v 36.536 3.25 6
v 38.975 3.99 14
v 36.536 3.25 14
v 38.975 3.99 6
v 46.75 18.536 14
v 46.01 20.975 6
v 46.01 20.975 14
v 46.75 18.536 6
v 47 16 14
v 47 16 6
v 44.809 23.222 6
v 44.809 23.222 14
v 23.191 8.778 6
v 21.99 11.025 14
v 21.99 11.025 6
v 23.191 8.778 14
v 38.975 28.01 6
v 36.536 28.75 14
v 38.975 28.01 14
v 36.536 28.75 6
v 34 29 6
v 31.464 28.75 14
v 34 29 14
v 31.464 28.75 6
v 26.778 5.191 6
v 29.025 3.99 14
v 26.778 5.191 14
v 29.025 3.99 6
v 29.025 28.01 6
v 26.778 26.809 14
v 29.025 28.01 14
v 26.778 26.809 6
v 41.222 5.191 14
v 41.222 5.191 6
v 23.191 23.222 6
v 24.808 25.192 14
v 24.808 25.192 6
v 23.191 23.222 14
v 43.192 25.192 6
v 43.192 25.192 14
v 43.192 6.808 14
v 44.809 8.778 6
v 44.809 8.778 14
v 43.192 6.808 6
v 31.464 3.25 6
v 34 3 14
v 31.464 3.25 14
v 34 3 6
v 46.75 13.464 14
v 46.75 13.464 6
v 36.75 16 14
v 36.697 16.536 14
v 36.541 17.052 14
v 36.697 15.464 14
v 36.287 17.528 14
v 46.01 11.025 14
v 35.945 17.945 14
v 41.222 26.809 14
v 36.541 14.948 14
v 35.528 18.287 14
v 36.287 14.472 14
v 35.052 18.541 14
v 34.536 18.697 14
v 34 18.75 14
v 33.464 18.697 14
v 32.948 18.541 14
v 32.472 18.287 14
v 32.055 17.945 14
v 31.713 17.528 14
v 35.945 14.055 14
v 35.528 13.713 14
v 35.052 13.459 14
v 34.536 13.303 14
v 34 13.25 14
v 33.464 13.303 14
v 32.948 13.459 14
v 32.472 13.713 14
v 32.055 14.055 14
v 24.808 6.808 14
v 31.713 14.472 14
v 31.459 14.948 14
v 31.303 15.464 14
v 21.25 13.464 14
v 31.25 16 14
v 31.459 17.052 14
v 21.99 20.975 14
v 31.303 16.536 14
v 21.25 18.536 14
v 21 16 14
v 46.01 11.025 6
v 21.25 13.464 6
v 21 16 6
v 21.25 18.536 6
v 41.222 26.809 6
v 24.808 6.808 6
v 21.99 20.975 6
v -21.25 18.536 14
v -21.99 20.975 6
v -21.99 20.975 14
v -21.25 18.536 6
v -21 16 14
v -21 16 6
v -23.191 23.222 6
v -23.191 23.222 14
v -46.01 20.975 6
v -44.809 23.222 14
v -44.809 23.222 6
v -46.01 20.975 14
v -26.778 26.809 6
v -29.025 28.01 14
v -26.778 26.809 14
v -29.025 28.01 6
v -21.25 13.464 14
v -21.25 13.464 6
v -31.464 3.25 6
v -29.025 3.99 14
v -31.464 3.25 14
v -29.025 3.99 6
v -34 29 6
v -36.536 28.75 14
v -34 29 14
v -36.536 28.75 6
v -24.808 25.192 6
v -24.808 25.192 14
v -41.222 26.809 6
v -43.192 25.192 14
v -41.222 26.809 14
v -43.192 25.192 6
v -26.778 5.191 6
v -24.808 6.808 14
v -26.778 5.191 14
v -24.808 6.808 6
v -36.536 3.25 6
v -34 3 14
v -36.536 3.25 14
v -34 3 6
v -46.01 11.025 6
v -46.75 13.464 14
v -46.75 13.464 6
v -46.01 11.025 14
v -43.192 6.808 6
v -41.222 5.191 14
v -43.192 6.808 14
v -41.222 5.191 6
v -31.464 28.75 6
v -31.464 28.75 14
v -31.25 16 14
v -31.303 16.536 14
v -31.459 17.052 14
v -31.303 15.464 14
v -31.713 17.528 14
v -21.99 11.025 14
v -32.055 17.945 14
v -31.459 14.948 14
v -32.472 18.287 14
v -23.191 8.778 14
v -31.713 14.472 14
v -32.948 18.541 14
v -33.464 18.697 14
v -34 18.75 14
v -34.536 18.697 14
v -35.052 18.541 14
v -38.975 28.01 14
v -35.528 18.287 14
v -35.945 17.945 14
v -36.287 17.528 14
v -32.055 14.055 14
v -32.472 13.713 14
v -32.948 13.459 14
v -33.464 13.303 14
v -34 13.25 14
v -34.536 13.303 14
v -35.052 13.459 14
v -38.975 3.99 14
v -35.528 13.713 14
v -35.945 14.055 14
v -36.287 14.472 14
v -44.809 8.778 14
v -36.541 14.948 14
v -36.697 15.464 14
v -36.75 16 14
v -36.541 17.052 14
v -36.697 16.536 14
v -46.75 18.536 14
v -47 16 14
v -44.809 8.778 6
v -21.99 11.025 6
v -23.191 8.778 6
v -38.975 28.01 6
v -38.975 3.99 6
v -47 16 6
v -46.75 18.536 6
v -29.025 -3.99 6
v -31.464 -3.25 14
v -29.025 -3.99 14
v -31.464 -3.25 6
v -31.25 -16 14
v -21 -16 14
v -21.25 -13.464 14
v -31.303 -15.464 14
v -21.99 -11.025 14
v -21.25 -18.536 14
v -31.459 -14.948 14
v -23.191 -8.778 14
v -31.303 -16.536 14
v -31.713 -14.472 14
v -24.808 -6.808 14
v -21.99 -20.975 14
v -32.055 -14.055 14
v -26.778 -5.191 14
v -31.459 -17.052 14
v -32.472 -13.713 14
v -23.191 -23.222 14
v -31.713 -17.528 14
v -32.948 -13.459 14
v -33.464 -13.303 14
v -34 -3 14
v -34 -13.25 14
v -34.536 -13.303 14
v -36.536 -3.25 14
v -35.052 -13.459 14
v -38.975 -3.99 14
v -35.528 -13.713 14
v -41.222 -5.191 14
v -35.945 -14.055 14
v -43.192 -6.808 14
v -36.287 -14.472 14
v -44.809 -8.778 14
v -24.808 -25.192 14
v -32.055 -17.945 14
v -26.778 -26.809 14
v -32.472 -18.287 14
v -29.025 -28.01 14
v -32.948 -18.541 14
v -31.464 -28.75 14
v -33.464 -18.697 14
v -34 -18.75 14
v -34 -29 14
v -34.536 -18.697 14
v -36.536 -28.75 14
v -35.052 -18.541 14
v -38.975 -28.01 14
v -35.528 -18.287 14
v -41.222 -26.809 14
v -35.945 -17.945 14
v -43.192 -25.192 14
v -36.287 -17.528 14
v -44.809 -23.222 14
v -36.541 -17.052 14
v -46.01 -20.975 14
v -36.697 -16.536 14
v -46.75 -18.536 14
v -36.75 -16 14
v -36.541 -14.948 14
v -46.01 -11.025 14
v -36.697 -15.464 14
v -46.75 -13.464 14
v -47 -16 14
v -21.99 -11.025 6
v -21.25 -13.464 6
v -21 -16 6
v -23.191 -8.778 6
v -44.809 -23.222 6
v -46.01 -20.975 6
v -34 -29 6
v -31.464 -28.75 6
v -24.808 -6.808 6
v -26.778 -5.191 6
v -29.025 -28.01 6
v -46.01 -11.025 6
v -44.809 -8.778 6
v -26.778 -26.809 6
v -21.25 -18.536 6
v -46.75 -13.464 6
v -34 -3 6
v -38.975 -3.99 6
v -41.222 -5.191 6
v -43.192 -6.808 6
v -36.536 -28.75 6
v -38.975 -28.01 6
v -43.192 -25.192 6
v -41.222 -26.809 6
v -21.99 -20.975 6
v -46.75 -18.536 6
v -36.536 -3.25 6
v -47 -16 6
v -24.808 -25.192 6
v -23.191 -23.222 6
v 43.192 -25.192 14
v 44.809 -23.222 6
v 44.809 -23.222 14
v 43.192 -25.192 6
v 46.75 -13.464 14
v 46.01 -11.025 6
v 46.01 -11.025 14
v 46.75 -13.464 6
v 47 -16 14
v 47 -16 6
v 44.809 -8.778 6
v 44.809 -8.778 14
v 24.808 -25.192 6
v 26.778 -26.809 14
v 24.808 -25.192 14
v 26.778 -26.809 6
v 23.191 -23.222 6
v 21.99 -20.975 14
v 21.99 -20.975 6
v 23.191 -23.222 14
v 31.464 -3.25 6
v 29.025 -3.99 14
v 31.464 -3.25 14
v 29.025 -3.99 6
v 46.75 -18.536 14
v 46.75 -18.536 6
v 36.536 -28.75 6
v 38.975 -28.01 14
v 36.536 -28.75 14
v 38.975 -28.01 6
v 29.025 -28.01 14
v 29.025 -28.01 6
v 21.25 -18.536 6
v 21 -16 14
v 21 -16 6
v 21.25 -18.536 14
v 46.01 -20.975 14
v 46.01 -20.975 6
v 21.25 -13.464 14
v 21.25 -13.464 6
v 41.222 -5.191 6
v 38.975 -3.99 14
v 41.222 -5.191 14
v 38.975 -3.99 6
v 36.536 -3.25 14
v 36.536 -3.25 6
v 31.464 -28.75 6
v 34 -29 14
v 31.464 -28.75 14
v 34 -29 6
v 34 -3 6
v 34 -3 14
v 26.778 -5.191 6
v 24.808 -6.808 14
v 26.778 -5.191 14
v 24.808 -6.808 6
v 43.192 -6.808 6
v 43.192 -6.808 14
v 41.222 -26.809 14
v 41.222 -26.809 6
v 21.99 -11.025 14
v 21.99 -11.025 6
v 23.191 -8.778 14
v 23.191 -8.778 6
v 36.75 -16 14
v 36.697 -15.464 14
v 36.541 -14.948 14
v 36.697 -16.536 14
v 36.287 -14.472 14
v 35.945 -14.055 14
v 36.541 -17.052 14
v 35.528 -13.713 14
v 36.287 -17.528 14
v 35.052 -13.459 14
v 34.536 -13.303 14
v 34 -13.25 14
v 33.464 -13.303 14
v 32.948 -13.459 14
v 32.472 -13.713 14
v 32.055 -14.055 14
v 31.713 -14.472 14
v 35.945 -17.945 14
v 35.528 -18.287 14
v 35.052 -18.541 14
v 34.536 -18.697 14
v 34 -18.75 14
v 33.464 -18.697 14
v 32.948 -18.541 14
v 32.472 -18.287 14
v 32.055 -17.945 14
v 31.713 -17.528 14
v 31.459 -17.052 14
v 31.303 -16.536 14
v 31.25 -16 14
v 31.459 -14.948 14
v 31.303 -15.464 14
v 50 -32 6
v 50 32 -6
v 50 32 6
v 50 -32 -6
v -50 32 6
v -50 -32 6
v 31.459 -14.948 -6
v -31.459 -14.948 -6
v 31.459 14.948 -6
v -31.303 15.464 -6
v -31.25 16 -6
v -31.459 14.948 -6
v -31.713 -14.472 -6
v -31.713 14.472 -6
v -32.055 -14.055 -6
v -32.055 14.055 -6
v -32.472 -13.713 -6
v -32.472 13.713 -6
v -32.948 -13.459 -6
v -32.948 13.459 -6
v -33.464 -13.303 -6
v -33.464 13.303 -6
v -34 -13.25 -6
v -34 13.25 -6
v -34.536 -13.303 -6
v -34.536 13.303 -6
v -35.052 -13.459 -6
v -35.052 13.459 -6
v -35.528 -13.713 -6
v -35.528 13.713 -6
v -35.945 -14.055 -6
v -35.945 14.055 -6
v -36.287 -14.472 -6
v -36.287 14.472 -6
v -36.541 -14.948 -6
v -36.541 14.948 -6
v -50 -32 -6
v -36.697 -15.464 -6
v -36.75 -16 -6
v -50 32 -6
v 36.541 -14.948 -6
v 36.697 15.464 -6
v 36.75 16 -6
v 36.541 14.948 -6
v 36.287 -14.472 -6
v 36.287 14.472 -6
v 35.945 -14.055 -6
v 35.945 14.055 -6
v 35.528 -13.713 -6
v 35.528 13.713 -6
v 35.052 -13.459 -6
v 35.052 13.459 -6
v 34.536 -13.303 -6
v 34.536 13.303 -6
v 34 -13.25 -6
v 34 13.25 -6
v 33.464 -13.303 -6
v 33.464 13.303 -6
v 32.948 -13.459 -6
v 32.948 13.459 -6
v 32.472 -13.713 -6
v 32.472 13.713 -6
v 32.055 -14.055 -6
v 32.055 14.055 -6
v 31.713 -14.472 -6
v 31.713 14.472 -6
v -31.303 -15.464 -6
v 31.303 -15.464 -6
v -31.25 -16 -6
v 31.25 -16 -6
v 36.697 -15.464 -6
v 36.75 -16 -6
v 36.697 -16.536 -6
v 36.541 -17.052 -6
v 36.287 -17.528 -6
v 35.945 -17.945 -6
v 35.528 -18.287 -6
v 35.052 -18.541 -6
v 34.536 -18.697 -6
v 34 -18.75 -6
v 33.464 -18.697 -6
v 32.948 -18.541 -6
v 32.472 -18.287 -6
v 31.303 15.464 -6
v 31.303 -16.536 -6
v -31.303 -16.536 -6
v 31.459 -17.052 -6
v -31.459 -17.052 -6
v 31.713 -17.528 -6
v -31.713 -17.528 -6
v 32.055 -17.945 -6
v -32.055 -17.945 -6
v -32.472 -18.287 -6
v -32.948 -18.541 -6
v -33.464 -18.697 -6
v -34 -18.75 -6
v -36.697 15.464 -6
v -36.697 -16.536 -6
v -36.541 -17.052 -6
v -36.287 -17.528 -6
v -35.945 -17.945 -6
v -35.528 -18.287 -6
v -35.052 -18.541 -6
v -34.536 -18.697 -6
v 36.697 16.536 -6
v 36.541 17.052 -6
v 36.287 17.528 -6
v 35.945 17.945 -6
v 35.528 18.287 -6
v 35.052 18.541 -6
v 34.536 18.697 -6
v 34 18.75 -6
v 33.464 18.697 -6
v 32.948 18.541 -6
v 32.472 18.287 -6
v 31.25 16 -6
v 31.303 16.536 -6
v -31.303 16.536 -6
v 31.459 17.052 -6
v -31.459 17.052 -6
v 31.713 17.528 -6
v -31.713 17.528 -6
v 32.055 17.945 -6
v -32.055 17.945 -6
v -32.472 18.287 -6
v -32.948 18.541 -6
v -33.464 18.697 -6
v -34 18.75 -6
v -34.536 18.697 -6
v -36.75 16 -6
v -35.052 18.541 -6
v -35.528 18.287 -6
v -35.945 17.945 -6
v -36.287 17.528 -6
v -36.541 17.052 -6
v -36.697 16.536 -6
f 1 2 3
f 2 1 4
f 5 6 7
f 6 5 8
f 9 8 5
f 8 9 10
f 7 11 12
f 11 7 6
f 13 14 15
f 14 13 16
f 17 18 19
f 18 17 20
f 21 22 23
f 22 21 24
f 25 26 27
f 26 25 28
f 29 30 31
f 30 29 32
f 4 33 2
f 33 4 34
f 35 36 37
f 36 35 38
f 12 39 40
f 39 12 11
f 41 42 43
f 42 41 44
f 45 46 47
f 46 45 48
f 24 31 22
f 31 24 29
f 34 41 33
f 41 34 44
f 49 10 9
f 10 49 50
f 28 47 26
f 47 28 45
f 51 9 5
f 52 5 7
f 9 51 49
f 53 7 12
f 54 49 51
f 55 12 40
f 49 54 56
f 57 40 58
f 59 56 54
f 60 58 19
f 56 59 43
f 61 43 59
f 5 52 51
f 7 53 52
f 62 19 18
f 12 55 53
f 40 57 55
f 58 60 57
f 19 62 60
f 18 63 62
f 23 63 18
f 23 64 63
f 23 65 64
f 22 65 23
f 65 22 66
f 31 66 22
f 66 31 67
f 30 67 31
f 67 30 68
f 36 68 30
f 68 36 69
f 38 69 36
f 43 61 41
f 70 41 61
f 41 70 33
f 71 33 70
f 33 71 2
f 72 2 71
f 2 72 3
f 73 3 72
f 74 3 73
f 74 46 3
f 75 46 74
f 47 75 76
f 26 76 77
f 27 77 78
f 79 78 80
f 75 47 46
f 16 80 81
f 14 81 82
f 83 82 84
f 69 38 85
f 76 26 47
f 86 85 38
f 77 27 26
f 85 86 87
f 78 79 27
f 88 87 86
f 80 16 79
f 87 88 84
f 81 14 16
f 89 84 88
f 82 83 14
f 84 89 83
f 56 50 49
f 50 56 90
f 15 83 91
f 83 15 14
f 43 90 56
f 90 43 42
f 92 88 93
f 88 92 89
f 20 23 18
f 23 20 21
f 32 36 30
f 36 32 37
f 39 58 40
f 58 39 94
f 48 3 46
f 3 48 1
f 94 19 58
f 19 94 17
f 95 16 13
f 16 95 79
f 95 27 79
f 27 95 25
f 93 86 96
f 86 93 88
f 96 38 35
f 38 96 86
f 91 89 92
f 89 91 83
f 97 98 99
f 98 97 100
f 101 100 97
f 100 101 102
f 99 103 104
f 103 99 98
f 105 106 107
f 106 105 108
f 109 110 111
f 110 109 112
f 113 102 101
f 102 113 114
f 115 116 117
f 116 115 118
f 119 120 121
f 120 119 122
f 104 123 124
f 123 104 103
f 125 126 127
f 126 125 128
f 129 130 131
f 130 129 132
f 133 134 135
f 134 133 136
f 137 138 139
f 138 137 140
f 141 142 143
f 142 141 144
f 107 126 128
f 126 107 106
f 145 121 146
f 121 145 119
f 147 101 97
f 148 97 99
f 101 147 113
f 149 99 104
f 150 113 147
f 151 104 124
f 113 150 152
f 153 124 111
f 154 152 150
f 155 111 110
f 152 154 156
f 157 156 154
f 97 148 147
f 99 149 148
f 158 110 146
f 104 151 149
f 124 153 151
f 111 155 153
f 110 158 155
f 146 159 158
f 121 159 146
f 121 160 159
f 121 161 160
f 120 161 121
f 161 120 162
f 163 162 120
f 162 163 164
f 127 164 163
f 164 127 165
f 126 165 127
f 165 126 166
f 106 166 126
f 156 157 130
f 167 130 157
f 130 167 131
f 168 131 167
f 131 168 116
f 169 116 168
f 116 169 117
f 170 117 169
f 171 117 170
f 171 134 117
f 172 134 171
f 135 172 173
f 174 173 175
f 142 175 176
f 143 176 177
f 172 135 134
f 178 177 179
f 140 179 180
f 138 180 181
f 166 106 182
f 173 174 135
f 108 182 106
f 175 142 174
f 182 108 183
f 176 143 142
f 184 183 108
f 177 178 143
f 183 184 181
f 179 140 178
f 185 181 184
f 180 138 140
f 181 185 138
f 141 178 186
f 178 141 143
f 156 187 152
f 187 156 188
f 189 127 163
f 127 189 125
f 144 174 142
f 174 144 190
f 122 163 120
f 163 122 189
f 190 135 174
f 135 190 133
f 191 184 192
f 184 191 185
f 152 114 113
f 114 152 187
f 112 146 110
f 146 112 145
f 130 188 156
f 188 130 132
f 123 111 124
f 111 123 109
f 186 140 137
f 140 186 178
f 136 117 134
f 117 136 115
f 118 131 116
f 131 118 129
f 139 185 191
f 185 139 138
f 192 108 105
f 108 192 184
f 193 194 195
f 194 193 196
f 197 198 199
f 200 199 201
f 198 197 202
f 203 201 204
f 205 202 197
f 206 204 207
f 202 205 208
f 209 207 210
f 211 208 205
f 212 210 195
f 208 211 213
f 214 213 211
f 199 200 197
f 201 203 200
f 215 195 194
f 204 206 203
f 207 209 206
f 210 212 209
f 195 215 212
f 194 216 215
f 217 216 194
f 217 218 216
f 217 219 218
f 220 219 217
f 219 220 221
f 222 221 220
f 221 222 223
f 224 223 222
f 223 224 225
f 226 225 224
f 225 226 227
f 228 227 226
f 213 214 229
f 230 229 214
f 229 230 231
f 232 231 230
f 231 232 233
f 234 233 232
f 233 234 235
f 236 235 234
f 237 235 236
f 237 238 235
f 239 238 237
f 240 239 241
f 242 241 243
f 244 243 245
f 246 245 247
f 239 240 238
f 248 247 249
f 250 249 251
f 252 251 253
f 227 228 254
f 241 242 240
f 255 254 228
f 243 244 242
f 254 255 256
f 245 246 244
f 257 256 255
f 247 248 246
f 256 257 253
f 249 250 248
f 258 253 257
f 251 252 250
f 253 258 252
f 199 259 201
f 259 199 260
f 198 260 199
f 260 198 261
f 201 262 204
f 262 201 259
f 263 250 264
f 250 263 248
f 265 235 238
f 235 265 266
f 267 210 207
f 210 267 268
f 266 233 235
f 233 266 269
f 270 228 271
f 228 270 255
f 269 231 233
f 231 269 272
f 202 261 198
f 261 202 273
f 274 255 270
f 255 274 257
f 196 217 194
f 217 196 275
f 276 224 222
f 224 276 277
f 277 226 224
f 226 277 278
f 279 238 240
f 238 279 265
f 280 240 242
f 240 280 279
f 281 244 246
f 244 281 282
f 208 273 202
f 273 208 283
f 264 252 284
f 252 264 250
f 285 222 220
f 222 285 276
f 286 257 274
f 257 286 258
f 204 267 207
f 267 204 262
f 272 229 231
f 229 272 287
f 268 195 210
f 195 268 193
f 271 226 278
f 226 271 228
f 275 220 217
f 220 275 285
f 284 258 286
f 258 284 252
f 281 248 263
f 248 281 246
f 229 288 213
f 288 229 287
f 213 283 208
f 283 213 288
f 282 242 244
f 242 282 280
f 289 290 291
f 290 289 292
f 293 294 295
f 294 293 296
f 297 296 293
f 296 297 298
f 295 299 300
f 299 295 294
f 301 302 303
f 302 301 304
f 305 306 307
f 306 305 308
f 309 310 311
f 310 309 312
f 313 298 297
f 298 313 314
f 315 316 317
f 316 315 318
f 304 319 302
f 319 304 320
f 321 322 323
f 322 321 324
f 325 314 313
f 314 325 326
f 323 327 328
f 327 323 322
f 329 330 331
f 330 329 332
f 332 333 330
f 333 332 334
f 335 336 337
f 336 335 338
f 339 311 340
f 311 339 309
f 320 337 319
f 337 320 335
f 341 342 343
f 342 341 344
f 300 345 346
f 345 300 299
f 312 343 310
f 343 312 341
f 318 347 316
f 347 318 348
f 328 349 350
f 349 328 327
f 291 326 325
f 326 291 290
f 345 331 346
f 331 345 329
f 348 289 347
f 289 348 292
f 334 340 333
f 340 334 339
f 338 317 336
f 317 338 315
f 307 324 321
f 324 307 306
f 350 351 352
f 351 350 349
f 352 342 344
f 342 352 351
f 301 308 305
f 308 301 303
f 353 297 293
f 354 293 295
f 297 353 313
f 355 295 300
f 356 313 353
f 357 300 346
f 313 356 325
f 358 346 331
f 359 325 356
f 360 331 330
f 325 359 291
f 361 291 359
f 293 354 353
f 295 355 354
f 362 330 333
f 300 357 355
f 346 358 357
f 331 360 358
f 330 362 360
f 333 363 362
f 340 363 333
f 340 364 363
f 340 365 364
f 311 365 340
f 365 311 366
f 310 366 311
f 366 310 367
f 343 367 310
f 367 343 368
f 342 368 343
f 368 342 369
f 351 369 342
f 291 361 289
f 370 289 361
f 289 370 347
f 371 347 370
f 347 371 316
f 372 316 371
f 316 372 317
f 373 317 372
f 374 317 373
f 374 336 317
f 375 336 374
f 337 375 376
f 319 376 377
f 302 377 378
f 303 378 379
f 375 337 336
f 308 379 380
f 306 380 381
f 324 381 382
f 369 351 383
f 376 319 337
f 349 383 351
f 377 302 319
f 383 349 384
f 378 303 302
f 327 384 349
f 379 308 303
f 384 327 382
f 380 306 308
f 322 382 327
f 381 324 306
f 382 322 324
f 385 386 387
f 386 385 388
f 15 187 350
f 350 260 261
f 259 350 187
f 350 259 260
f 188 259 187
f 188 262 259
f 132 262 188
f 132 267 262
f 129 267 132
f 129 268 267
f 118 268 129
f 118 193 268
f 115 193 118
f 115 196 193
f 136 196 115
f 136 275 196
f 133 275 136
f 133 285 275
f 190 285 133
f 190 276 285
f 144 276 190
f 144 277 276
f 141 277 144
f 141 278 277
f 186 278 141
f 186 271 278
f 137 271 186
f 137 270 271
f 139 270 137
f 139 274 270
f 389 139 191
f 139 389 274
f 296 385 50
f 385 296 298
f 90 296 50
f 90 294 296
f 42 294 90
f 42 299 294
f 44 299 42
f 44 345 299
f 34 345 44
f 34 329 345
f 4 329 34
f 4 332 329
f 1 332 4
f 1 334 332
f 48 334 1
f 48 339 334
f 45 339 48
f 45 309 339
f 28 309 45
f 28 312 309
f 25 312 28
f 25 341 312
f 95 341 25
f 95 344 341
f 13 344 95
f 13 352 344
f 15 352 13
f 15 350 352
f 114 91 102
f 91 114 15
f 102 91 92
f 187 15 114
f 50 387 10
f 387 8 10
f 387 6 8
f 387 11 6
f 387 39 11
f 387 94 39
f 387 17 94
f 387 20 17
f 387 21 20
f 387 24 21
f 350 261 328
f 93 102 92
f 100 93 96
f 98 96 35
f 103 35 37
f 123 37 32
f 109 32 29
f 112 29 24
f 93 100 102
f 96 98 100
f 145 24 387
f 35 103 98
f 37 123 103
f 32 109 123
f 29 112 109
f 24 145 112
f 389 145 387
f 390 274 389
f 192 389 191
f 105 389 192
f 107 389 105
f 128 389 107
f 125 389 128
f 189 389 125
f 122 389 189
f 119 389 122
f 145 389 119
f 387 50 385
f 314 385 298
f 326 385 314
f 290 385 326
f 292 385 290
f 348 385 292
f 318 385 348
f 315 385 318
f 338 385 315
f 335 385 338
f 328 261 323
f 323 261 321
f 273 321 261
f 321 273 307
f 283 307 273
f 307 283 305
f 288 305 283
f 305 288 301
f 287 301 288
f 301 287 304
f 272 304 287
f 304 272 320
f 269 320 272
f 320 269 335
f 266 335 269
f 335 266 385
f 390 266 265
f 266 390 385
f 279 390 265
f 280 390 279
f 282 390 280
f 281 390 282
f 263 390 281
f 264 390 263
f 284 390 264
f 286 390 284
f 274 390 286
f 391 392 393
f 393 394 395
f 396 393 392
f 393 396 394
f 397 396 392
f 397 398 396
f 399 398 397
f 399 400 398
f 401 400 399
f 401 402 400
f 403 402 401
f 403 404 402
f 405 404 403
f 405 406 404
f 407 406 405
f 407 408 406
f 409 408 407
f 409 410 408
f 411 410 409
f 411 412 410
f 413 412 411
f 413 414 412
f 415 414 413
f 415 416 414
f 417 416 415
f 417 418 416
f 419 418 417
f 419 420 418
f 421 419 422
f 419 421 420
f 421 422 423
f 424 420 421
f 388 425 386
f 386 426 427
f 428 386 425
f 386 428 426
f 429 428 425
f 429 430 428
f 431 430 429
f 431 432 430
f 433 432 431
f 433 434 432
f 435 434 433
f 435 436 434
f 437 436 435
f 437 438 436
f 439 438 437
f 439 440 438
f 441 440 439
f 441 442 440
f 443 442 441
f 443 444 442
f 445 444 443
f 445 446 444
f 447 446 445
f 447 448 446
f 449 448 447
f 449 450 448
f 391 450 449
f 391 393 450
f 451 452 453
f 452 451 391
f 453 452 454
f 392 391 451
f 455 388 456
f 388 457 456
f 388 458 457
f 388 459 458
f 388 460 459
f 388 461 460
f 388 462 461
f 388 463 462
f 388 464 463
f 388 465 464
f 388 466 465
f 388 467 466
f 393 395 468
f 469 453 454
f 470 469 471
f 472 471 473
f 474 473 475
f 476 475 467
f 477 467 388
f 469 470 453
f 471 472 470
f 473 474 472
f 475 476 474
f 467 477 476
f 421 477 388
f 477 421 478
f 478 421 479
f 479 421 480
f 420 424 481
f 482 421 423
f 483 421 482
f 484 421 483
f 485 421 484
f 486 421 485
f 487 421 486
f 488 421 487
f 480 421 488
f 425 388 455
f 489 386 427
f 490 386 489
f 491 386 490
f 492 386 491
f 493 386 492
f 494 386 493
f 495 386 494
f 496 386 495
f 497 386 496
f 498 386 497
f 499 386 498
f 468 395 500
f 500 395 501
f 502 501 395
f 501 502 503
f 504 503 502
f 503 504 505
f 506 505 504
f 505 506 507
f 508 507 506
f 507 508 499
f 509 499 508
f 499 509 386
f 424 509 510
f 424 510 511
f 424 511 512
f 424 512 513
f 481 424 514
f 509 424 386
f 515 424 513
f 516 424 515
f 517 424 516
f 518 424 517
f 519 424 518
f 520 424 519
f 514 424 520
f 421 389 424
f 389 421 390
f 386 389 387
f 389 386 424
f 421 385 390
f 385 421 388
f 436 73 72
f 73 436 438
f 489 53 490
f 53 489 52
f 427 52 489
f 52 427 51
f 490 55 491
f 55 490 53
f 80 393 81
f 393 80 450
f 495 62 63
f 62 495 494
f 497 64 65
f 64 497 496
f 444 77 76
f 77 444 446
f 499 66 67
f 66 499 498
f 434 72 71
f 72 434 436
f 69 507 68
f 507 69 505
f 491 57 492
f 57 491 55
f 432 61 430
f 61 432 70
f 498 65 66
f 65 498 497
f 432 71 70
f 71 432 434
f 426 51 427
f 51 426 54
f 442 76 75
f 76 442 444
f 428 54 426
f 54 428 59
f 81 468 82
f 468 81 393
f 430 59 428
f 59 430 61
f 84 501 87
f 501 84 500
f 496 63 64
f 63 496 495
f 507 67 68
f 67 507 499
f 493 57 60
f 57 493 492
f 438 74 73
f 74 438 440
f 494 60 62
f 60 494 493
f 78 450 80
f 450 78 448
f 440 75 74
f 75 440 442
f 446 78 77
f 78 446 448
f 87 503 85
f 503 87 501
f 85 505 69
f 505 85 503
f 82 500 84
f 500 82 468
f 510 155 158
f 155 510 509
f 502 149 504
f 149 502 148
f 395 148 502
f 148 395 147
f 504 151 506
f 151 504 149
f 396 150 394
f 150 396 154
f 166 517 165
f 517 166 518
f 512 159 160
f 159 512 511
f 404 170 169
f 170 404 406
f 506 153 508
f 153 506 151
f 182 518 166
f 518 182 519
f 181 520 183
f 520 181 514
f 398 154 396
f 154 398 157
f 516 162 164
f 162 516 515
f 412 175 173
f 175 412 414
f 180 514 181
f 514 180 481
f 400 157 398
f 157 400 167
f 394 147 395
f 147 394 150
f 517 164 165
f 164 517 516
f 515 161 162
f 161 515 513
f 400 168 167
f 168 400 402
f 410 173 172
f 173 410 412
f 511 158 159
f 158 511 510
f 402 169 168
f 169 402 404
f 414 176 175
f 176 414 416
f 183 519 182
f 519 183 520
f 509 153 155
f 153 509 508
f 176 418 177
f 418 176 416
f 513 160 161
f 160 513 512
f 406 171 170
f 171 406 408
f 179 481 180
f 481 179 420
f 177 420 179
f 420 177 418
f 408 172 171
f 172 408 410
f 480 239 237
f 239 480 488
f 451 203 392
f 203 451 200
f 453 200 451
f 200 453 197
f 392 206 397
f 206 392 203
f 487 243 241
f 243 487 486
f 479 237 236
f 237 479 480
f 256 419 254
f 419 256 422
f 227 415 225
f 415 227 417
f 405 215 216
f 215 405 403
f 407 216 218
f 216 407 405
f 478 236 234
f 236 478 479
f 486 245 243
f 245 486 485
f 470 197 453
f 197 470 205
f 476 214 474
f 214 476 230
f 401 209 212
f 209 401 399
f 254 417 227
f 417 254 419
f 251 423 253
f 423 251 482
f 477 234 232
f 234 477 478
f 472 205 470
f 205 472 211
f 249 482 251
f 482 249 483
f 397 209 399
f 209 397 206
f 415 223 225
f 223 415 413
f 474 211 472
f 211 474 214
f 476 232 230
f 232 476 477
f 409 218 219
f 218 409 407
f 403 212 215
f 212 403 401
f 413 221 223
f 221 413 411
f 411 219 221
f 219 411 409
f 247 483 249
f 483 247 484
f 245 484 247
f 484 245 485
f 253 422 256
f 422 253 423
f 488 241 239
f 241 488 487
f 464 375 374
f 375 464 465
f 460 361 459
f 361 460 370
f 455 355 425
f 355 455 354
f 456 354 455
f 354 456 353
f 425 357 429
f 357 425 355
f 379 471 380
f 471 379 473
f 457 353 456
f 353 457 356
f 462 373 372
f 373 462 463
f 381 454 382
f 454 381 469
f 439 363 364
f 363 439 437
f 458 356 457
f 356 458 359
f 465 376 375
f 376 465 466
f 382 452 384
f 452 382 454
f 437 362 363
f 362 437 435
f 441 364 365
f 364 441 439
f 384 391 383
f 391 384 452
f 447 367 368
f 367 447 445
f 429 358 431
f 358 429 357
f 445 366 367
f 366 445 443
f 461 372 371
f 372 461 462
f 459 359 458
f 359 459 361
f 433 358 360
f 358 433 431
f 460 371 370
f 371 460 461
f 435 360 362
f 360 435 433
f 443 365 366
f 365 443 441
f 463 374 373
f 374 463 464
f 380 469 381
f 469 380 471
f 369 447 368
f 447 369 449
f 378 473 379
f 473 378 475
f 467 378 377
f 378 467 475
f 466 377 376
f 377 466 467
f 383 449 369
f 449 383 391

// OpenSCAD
$fn = 32;

// ----------------------------------------------------------------------
// Anchor pads 100 x 64 x 20
// four corner bosses with anchor holes
// ----------------------------------------------------------------------

// --- parameters (mm) ---
plate = [100, 64, 12];  // base plate size (x, y, z)
pads = 4;               // boss count, one per corner
edge = 16;              // boss centre offset from the plate edge
boss_d = 26;            // boss diameter
boss_h = 8;             // boss height above the base plate
hole_d = 5.5;           // hole diameter

// --- derived feature positions (mm) ---
height = plate[2] + boss_h;      // = 20   overall height of the part
corner_x = plate[0] / 2 - edge;  // = 34   boss centre X
corner_y = plate[1] / 2 - edge;  // = 16   boss centre Y
feature_centers = [
  [corner_x, corner_y],
  [-corner_x, corner_y],
  [-corner_x, -corner_y],
  [corner_x, -corner_y]
];   // boss centres, anchor holes are drilled there

// base plate, four bosses standing on it, anchor holes all the way through
difference() {
  union() {
    cube(plate, center = true);
    for (centre = feature_centers)
      translate([centre[0], centre[1], plate[2] / 2 - 1])
        cylinder(d = boss_d, h = boss_h + 1);
  }
  for (centre = feature_centers)
    translate([centre[0], centre[1], -height])
      cylinder(d = hole_d, h = 2 * height + 2);  // through boss and plate
}
